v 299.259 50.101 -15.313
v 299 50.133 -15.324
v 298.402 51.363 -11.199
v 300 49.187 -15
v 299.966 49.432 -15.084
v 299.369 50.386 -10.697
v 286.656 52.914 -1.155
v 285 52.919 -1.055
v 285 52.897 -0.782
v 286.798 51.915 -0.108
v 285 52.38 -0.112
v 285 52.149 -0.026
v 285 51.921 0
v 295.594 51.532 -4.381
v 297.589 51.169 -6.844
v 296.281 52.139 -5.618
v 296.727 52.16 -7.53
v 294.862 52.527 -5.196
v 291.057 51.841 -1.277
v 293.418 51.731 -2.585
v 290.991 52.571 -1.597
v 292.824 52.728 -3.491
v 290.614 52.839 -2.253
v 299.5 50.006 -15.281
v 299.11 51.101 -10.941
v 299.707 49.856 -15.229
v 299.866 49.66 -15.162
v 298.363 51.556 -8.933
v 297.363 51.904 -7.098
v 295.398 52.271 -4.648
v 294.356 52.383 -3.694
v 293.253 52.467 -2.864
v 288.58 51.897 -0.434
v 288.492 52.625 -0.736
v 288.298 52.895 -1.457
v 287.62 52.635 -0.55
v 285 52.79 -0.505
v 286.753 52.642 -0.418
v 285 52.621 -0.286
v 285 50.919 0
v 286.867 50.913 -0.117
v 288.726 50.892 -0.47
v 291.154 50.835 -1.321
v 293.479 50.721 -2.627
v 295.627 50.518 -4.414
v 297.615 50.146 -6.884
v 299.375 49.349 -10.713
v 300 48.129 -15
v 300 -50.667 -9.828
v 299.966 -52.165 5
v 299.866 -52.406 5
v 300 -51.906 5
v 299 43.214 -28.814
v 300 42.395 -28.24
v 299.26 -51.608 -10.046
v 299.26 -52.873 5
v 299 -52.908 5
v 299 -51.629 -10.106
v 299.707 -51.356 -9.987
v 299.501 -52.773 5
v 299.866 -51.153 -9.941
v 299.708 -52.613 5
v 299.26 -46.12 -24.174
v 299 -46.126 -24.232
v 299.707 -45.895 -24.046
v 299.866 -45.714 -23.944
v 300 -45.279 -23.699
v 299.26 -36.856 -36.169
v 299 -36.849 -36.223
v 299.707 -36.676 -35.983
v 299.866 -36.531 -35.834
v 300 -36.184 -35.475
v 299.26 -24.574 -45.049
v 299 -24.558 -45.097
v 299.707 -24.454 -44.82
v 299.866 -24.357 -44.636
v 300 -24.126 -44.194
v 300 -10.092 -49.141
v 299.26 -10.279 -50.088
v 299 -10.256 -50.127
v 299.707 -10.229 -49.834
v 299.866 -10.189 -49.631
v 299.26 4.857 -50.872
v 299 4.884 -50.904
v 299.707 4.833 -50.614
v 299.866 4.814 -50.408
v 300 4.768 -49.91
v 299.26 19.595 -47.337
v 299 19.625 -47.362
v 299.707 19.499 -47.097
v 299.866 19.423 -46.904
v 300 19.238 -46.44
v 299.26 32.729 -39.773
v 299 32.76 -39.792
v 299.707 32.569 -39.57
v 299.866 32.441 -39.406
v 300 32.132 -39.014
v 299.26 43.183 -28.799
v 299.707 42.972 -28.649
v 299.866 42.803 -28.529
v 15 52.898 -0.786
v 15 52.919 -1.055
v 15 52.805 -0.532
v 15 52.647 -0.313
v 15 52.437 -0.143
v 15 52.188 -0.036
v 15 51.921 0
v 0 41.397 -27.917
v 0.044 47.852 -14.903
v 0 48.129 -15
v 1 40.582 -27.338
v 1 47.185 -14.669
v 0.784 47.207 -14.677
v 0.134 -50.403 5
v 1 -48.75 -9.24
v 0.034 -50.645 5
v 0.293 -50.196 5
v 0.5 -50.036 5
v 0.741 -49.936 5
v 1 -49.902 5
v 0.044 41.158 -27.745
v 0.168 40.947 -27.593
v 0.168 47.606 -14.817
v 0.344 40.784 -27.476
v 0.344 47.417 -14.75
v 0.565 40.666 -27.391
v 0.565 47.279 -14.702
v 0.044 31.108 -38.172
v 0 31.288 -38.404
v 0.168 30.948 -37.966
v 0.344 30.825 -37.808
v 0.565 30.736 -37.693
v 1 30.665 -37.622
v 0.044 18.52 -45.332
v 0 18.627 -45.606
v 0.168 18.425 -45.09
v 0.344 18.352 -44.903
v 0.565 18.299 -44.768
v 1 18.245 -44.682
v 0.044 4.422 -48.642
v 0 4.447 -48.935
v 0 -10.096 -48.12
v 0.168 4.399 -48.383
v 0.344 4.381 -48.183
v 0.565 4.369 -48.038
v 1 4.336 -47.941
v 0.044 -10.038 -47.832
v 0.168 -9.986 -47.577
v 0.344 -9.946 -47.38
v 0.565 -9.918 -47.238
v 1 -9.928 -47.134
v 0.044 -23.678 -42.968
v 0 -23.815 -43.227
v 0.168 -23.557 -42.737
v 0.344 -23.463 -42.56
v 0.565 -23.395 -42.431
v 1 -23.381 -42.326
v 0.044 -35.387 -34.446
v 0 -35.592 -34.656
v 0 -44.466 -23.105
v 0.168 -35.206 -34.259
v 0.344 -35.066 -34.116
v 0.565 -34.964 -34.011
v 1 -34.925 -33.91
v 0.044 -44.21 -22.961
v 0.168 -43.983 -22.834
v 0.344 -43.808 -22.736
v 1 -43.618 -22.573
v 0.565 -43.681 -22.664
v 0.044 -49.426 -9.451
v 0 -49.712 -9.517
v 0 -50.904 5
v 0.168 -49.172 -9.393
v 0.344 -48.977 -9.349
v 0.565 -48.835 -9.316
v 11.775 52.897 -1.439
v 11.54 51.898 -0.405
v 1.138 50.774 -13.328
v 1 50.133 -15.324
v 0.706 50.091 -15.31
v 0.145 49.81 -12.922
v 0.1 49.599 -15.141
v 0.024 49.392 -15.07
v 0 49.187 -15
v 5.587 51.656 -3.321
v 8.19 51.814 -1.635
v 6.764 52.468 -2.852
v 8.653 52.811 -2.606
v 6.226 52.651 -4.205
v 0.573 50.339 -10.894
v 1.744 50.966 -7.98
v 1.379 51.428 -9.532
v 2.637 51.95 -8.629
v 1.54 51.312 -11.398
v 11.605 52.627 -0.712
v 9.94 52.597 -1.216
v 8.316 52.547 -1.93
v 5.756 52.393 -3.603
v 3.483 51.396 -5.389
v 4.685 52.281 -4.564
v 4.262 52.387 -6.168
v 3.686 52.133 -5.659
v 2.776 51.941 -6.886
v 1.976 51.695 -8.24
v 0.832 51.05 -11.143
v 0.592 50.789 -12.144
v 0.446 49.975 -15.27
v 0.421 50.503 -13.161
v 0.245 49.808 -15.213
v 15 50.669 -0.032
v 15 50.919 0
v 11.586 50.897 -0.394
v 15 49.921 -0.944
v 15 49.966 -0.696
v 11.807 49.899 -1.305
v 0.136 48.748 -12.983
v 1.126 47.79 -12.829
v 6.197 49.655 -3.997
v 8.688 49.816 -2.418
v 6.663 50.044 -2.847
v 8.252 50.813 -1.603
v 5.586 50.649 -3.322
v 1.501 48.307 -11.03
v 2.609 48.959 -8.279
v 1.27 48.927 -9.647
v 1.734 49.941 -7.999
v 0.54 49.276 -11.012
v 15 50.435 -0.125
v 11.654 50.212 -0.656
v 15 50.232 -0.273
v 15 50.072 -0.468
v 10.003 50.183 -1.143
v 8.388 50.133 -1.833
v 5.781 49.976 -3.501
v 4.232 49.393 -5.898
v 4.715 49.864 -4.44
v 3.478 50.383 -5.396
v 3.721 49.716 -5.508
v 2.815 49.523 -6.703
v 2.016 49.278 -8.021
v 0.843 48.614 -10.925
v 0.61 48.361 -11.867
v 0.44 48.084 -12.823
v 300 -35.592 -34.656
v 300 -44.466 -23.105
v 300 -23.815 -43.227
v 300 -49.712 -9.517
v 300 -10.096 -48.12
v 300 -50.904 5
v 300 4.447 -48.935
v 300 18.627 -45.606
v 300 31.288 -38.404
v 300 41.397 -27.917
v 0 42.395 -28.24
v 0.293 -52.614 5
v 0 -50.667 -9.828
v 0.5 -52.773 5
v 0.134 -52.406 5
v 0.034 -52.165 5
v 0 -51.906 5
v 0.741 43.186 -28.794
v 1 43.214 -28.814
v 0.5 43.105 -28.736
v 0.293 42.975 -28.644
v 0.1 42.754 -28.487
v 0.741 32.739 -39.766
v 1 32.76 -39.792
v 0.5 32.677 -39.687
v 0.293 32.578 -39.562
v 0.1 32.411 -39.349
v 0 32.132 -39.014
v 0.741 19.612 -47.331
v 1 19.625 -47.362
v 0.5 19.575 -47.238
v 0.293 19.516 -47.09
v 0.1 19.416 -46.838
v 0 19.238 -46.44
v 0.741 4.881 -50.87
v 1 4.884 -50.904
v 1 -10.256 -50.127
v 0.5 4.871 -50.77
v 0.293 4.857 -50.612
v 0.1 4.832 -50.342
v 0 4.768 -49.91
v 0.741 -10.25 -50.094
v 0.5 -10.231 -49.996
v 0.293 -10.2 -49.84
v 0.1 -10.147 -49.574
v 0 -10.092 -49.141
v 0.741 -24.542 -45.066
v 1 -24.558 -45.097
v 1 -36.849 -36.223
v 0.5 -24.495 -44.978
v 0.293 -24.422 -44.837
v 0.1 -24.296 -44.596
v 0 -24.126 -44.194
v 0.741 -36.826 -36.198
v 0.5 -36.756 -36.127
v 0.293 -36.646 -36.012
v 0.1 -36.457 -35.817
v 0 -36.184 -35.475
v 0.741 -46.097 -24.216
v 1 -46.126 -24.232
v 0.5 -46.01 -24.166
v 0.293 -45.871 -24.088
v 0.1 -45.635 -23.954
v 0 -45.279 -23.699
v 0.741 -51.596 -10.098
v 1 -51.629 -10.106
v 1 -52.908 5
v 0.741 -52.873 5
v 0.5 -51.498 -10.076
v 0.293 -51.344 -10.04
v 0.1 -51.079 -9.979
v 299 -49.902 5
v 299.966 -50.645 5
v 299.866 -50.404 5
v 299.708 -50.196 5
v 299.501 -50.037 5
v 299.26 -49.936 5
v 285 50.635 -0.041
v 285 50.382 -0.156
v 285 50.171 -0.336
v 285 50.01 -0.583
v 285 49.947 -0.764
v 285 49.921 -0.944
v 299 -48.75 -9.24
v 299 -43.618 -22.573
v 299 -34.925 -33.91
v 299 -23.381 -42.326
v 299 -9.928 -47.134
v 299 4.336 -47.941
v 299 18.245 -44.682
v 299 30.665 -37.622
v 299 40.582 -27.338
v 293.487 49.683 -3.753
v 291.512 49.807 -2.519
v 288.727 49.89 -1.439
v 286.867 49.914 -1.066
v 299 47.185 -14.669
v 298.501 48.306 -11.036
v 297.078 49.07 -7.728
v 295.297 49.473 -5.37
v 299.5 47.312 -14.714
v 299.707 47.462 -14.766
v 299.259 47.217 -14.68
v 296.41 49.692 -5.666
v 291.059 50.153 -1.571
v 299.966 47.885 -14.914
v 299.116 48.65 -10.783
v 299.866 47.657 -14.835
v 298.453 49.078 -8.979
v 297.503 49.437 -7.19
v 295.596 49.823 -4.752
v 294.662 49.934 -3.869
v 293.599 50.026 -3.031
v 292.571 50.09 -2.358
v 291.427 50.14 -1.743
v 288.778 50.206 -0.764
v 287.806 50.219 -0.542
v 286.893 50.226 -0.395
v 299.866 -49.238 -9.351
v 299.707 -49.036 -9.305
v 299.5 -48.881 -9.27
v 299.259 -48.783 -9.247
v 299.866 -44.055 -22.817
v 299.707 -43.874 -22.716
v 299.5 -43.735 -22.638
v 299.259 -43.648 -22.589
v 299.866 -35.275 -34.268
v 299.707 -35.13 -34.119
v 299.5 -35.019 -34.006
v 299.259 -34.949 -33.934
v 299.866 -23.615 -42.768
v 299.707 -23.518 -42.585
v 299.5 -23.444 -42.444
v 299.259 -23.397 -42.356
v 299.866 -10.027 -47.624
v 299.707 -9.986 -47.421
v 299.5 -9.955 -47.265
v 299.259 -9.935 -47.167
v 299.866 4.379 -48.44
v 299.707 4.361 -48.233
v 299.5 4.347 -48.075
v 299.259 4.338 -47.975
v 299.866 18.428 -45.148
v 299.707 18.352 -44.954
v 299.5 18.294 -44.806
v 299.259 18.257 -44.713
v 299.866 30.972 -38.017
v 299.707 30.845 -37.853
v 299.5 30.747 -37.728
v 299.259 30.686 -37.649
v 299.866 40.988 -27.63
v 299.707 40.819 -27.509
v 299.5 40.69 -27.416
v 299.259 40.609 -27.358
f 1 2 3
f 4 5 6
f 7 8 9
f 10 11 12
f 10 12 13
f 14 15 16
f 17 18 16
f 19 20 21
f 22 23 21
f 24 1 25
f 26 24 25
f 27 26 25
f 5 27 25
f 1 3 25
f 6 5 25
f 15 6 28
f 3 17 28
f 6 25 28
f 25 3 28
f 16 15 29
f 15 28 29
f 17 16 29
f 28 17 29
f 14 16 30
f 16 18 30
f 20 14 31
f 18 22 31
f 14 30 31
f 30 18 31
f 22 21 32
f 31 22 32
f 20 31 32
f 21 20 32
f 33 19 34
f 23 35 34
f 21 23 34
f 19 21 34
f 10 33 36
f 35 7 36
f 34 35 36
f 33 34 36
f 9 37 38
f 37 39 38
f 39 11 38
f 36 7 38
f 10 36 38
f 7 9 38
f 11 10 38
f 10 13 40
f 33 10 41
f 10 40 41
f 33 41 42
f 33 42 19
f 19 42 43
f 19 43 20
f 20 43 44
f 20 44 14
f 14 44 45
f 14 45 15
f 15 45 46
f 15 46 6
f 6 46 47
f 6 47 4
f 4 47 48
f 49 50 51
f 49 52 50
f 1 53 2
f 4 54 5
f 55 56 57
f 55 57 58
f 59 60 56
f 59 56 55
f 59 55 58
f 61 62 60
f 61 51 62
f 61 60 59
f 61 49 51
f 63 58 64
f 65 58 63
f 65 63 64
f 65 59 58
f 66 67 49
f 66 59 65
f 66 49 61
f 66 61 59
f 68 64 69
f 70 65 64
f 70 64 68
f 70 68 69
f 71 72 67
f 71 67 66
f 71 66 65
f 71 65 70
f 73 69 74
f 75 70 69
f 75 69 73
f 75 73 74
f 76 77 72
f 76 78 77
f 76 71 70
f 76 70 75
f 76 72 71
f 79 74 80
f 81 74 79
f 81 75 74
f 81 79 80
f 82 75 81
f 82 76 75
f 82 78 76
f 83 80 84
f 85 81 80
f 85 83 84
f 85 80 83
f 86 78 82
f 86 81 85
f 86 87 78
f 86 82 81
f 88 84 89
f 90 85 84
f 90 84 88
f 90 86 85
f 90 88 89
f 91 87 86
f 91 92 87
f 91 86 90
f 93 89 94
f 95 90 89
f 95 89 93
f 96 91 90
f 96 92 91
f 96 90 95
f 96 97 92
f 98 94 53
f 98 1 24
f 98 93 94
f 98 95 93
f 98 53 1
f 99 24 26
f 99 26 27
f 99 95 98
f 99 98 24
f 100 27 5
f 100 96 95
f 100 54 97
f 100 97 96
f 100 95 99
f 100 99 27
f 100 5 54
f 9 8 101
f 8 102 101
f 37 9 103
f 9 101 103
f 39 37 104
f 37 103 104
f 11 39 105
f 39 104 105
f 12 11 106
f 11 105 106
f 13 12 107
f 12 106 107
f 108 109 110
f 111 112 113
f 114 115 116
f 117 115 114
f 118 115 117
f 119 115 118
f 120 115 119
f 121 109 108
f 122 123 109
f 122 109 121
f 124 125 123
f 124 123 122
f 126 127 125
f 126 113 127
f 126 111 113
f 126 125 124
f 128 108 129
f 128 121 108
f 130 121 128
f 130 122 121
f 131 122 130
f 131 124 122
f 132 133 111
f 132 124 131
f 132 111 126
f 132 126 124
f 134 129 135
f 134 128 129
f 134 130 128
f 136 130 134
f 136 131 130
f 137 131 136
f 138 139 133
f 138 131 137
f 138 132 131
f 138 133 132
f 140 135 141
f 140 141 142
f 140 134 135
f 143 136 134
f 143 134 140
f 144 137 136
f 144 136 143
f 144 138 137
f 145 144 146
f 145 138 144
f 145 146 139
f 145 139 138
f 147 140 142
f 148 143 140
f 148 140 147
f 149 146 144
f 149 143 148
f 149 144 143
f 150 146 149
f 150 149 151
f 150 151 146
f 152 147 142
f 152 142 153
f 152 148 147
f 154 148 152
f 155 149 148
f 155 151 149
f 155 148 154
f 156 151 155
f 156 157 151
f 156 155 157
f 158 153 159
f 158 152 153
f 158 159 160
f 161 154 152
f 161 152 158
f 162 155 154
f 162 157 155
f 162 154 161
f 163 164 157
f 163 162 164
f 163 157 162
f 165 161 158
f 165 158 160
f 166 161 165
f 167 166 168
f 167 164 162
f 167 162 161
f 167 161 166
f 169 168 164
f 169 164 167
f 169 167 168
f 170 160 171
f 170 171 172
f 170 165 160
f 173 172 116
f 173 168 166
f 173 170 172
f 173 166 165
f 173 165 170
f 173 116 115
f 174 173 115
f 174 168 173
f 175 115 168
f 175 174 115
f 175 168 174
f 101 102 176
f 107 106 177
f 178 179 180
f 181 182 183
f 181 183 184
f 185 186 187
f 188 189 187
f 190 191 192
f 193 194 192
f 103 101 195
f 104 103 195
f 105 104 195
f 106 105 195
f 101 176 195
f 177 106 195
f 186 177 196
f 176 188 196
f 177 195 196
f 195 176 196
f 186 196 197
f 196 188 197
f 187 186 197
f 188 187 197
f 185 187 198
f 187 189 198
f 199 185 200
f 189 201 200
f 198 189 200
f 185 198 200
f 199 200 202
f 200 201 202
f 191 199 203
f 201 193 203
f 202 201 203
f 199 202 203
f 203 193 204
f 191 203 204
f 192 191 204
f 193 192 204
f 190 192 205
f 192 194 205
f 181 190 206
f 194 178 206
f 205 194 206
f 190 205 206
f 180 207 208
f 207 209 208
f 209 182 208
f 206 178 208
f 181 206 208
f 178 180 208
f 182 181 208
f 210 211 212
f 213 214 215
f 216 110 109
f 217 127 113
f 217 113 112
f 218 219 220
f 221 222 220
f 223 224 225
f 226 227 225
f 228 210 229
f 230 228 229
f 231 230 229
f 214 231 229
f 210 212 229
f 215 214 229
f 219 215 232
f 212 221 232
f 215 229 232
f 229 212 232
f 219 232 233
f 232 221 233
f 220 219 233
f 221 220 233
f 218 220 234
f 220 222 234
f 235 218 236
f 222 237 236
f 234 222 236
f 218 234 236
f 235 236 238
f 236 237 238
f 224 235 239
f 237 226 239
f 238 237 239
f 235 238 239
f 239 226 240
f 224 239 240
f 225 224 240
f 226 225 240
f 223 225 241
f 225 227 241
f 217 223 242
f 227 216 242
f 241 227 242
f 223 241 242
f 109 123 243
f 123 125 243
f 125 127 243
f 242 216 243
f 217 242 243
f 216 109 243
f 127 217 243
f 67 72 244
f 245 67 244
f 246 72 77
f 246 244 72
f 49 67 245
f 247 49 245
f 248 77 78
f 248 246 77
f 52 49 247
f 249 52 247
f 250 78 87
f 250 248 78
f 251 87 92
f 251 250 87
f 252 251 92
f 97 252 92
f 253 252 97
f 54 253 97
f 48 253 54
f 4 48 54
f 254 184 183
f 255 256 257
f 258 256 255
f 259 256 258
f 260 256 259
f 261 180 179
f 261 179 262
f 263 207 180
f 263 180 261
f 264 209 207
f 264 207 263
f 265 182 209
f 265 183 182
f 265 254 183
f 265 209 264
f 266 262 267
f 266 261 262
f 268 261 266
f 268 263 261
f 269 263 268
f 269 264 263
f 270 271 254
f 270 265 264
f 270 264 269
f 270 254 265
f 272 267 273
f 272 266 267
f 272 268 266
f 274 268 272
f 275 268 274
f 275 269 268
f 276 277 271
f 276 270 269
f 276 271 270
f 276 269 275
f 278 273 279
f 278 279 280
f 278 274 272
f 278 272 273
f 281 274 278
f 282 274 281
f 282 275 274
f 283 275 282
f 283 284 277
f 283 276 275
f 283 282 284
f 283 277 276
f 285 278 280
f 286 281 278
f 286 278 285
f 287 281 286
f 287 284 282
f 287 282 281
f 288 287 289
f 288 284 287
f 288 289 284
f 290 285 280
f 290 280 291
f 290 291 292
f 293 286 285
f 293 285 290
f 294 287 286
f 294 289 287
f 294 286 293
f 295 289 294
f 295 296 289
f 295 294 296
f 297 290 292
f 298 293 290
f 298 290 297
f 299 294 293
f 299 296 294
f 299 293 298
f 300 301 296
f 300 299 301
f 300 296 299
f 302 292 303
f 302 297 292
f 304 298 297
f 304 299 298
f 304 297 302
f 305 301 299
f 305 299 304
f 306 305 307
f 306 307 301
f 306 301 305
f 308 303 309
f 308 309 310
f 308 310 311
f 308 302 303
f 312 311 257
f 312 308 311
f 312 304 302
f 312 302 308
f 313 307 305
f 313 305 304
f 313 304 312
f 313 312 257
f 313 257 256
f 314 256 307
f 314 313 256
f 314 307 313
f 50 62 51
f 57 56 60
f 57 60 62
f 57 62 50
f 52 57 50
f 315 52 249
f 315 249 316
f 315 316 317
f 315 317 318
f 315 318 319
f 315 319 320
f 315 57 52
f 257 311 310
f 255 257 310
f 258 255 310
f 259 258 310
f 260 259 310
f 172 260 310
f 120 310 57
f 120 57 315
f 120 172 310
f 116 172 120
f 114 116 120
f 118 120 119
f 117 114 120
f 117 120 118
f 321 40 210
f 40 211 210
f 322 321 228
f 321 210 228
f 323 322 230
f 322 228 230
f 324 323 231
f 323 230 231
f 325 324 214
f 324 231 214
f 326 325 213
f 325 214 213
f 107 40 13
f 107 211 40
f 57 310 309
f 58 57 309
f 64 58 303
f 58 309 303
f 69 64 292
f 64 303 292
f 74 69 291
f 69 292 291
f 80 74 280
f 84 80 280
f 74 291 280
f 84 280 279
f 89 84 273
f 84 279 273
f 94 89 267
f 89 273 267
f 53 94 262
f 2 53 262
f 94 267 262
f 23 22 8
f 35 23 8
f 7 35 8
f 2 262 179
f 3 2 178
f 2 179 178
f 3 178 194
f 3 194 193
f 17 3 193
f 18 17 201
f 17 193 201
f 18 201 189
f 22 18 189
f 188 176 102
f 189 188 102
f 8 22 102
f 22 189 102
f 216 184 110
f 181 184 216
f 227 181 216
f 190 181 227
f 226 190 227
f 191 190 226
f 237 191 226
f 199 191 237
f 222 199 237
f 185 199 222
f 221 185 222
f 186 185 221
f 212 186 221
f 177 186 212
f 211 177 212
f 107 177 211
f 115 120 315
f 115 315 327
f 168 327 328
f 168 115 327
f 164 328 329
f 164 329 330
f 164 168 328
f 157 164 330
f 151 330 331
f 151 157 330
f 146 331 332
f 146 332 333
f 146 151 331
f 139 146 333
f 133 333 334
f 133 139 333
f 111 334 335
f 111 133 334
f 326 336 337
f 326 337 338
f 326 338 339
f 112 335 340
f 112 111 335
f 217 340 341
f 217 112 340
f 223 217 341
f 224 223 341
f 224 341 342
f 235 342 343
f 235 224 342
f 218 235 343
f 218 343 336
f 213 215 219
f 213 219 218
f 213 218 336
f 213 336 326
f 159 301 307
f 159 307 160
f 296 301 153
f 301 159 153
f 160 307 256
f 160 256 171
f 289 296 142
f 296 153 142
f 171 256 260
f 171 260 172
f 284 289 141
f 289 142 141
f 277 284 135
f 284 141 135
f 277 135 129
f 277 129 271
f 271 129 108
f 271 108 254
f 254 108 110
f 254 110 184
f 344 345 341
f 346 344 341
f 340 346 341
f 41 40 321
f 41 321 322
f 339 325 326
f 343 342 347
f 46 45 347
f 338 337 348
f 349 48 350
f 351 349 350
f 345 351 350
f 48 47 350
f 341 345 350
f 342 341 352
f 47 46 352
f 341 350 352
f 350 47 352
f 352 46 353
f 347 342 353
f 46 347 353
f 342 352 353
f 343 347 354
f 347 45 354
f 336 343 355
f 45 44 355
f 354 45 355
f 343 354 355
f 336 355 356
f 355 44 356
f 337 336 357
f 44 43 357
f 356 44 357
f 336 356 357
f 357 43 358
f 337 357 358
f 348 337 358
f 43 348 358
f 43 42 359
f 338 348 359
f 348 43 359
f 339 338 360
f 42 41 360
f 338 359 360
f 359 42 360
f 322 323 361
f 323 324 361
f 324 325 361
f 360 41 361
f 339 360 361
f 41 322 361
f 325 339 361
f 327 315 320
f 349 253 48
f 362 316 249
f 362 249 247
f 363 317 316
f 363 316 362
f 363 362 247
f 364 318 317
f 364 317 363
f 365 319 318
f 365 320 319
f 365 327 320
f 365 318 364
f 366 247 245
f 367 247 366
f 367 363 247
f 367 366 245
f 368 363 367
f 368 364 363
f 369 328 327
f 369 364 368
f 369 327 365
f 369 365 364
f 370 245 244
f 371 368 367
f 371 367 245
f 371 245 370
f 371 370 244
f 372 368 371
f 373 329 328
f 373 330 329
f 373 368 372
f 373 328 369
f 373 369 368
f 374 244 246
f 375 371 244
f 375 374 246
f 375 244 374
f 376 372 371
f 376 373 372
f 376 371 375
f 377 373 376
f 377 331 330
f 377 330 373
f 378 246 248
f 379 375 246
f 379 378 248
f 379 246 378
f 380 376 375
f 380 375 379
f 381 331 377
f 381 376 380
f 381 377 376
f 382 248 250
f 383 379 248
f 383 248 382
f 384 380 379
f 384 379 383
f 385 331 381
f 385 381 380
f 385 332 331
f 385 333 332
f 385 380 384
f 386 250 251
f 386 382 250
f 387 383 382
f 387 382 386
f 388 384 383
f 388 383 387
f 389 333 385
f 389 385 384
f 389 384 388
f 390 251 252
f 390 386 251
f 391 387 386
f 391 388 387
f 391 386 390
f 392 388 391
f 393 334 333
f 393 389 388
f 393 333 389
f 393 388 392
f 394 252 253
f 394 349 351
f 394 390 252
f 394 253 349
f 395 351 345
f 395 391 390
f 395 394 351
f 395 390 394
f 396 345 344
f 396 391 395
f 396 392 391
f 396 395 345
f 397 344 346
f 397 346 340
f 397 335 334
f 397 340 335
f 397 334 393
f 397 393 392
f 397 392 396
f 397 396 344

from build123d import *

# Parameters (mm, degrees)
F0_R     = 53
F0_R_2   = 50
F1_DEPTH = 300
F3_DEPTH = 300.001
F4_R     = 15
F5_R     = 1


with BuildPart() as f1:
    # F0 (on Right) → F1 (new body)
    with BuildSketch(Plane.YZ):
        with Locations((0, 1.8706418186)):
            Circle(F0_R)
        with Locations((0, 1.8706418186)):
            Circle(F0_R_2, mode=Mode.SUBTRACT)
    extrude(amount=F1_DEPTH)

    # F2 (on Right) → F3 (cut, through all)
    with BuildSketch(Plane.YZ):
        Polygon((-45, 0), (0, 0), (150.288850058, 0), (150.288850058, 138.1199563971), (0, 138.1199563971), (-236.3291914778, 138.1199563971), (-236.3291914778, 0), (-65, 0), (-65, 5), (-45, 5), align=None)
    extrude(amount=F3_DEPTH, mode=Mode.SUBTRACT)

    # F4
    f4_edges = [f1.edges().sort_by_distance(p)[0] for p in [
        (300, 51.465986, 0),
        (0, 51.465986, 0),
    ]]
    fillet(f4_edges, radius=F4_R)

    # F5
    f5_edges = [f1.edges().sort_by_distance(p)[0] for p in [
        (150, 52.966977, 0),
        (285, 51.465986, 0),
        (15, 51.465986, 0),
        (150, 49.964995, 0),
    ]]
    fillet(f5_edges, radius=F5_R)


solid = f1.part
